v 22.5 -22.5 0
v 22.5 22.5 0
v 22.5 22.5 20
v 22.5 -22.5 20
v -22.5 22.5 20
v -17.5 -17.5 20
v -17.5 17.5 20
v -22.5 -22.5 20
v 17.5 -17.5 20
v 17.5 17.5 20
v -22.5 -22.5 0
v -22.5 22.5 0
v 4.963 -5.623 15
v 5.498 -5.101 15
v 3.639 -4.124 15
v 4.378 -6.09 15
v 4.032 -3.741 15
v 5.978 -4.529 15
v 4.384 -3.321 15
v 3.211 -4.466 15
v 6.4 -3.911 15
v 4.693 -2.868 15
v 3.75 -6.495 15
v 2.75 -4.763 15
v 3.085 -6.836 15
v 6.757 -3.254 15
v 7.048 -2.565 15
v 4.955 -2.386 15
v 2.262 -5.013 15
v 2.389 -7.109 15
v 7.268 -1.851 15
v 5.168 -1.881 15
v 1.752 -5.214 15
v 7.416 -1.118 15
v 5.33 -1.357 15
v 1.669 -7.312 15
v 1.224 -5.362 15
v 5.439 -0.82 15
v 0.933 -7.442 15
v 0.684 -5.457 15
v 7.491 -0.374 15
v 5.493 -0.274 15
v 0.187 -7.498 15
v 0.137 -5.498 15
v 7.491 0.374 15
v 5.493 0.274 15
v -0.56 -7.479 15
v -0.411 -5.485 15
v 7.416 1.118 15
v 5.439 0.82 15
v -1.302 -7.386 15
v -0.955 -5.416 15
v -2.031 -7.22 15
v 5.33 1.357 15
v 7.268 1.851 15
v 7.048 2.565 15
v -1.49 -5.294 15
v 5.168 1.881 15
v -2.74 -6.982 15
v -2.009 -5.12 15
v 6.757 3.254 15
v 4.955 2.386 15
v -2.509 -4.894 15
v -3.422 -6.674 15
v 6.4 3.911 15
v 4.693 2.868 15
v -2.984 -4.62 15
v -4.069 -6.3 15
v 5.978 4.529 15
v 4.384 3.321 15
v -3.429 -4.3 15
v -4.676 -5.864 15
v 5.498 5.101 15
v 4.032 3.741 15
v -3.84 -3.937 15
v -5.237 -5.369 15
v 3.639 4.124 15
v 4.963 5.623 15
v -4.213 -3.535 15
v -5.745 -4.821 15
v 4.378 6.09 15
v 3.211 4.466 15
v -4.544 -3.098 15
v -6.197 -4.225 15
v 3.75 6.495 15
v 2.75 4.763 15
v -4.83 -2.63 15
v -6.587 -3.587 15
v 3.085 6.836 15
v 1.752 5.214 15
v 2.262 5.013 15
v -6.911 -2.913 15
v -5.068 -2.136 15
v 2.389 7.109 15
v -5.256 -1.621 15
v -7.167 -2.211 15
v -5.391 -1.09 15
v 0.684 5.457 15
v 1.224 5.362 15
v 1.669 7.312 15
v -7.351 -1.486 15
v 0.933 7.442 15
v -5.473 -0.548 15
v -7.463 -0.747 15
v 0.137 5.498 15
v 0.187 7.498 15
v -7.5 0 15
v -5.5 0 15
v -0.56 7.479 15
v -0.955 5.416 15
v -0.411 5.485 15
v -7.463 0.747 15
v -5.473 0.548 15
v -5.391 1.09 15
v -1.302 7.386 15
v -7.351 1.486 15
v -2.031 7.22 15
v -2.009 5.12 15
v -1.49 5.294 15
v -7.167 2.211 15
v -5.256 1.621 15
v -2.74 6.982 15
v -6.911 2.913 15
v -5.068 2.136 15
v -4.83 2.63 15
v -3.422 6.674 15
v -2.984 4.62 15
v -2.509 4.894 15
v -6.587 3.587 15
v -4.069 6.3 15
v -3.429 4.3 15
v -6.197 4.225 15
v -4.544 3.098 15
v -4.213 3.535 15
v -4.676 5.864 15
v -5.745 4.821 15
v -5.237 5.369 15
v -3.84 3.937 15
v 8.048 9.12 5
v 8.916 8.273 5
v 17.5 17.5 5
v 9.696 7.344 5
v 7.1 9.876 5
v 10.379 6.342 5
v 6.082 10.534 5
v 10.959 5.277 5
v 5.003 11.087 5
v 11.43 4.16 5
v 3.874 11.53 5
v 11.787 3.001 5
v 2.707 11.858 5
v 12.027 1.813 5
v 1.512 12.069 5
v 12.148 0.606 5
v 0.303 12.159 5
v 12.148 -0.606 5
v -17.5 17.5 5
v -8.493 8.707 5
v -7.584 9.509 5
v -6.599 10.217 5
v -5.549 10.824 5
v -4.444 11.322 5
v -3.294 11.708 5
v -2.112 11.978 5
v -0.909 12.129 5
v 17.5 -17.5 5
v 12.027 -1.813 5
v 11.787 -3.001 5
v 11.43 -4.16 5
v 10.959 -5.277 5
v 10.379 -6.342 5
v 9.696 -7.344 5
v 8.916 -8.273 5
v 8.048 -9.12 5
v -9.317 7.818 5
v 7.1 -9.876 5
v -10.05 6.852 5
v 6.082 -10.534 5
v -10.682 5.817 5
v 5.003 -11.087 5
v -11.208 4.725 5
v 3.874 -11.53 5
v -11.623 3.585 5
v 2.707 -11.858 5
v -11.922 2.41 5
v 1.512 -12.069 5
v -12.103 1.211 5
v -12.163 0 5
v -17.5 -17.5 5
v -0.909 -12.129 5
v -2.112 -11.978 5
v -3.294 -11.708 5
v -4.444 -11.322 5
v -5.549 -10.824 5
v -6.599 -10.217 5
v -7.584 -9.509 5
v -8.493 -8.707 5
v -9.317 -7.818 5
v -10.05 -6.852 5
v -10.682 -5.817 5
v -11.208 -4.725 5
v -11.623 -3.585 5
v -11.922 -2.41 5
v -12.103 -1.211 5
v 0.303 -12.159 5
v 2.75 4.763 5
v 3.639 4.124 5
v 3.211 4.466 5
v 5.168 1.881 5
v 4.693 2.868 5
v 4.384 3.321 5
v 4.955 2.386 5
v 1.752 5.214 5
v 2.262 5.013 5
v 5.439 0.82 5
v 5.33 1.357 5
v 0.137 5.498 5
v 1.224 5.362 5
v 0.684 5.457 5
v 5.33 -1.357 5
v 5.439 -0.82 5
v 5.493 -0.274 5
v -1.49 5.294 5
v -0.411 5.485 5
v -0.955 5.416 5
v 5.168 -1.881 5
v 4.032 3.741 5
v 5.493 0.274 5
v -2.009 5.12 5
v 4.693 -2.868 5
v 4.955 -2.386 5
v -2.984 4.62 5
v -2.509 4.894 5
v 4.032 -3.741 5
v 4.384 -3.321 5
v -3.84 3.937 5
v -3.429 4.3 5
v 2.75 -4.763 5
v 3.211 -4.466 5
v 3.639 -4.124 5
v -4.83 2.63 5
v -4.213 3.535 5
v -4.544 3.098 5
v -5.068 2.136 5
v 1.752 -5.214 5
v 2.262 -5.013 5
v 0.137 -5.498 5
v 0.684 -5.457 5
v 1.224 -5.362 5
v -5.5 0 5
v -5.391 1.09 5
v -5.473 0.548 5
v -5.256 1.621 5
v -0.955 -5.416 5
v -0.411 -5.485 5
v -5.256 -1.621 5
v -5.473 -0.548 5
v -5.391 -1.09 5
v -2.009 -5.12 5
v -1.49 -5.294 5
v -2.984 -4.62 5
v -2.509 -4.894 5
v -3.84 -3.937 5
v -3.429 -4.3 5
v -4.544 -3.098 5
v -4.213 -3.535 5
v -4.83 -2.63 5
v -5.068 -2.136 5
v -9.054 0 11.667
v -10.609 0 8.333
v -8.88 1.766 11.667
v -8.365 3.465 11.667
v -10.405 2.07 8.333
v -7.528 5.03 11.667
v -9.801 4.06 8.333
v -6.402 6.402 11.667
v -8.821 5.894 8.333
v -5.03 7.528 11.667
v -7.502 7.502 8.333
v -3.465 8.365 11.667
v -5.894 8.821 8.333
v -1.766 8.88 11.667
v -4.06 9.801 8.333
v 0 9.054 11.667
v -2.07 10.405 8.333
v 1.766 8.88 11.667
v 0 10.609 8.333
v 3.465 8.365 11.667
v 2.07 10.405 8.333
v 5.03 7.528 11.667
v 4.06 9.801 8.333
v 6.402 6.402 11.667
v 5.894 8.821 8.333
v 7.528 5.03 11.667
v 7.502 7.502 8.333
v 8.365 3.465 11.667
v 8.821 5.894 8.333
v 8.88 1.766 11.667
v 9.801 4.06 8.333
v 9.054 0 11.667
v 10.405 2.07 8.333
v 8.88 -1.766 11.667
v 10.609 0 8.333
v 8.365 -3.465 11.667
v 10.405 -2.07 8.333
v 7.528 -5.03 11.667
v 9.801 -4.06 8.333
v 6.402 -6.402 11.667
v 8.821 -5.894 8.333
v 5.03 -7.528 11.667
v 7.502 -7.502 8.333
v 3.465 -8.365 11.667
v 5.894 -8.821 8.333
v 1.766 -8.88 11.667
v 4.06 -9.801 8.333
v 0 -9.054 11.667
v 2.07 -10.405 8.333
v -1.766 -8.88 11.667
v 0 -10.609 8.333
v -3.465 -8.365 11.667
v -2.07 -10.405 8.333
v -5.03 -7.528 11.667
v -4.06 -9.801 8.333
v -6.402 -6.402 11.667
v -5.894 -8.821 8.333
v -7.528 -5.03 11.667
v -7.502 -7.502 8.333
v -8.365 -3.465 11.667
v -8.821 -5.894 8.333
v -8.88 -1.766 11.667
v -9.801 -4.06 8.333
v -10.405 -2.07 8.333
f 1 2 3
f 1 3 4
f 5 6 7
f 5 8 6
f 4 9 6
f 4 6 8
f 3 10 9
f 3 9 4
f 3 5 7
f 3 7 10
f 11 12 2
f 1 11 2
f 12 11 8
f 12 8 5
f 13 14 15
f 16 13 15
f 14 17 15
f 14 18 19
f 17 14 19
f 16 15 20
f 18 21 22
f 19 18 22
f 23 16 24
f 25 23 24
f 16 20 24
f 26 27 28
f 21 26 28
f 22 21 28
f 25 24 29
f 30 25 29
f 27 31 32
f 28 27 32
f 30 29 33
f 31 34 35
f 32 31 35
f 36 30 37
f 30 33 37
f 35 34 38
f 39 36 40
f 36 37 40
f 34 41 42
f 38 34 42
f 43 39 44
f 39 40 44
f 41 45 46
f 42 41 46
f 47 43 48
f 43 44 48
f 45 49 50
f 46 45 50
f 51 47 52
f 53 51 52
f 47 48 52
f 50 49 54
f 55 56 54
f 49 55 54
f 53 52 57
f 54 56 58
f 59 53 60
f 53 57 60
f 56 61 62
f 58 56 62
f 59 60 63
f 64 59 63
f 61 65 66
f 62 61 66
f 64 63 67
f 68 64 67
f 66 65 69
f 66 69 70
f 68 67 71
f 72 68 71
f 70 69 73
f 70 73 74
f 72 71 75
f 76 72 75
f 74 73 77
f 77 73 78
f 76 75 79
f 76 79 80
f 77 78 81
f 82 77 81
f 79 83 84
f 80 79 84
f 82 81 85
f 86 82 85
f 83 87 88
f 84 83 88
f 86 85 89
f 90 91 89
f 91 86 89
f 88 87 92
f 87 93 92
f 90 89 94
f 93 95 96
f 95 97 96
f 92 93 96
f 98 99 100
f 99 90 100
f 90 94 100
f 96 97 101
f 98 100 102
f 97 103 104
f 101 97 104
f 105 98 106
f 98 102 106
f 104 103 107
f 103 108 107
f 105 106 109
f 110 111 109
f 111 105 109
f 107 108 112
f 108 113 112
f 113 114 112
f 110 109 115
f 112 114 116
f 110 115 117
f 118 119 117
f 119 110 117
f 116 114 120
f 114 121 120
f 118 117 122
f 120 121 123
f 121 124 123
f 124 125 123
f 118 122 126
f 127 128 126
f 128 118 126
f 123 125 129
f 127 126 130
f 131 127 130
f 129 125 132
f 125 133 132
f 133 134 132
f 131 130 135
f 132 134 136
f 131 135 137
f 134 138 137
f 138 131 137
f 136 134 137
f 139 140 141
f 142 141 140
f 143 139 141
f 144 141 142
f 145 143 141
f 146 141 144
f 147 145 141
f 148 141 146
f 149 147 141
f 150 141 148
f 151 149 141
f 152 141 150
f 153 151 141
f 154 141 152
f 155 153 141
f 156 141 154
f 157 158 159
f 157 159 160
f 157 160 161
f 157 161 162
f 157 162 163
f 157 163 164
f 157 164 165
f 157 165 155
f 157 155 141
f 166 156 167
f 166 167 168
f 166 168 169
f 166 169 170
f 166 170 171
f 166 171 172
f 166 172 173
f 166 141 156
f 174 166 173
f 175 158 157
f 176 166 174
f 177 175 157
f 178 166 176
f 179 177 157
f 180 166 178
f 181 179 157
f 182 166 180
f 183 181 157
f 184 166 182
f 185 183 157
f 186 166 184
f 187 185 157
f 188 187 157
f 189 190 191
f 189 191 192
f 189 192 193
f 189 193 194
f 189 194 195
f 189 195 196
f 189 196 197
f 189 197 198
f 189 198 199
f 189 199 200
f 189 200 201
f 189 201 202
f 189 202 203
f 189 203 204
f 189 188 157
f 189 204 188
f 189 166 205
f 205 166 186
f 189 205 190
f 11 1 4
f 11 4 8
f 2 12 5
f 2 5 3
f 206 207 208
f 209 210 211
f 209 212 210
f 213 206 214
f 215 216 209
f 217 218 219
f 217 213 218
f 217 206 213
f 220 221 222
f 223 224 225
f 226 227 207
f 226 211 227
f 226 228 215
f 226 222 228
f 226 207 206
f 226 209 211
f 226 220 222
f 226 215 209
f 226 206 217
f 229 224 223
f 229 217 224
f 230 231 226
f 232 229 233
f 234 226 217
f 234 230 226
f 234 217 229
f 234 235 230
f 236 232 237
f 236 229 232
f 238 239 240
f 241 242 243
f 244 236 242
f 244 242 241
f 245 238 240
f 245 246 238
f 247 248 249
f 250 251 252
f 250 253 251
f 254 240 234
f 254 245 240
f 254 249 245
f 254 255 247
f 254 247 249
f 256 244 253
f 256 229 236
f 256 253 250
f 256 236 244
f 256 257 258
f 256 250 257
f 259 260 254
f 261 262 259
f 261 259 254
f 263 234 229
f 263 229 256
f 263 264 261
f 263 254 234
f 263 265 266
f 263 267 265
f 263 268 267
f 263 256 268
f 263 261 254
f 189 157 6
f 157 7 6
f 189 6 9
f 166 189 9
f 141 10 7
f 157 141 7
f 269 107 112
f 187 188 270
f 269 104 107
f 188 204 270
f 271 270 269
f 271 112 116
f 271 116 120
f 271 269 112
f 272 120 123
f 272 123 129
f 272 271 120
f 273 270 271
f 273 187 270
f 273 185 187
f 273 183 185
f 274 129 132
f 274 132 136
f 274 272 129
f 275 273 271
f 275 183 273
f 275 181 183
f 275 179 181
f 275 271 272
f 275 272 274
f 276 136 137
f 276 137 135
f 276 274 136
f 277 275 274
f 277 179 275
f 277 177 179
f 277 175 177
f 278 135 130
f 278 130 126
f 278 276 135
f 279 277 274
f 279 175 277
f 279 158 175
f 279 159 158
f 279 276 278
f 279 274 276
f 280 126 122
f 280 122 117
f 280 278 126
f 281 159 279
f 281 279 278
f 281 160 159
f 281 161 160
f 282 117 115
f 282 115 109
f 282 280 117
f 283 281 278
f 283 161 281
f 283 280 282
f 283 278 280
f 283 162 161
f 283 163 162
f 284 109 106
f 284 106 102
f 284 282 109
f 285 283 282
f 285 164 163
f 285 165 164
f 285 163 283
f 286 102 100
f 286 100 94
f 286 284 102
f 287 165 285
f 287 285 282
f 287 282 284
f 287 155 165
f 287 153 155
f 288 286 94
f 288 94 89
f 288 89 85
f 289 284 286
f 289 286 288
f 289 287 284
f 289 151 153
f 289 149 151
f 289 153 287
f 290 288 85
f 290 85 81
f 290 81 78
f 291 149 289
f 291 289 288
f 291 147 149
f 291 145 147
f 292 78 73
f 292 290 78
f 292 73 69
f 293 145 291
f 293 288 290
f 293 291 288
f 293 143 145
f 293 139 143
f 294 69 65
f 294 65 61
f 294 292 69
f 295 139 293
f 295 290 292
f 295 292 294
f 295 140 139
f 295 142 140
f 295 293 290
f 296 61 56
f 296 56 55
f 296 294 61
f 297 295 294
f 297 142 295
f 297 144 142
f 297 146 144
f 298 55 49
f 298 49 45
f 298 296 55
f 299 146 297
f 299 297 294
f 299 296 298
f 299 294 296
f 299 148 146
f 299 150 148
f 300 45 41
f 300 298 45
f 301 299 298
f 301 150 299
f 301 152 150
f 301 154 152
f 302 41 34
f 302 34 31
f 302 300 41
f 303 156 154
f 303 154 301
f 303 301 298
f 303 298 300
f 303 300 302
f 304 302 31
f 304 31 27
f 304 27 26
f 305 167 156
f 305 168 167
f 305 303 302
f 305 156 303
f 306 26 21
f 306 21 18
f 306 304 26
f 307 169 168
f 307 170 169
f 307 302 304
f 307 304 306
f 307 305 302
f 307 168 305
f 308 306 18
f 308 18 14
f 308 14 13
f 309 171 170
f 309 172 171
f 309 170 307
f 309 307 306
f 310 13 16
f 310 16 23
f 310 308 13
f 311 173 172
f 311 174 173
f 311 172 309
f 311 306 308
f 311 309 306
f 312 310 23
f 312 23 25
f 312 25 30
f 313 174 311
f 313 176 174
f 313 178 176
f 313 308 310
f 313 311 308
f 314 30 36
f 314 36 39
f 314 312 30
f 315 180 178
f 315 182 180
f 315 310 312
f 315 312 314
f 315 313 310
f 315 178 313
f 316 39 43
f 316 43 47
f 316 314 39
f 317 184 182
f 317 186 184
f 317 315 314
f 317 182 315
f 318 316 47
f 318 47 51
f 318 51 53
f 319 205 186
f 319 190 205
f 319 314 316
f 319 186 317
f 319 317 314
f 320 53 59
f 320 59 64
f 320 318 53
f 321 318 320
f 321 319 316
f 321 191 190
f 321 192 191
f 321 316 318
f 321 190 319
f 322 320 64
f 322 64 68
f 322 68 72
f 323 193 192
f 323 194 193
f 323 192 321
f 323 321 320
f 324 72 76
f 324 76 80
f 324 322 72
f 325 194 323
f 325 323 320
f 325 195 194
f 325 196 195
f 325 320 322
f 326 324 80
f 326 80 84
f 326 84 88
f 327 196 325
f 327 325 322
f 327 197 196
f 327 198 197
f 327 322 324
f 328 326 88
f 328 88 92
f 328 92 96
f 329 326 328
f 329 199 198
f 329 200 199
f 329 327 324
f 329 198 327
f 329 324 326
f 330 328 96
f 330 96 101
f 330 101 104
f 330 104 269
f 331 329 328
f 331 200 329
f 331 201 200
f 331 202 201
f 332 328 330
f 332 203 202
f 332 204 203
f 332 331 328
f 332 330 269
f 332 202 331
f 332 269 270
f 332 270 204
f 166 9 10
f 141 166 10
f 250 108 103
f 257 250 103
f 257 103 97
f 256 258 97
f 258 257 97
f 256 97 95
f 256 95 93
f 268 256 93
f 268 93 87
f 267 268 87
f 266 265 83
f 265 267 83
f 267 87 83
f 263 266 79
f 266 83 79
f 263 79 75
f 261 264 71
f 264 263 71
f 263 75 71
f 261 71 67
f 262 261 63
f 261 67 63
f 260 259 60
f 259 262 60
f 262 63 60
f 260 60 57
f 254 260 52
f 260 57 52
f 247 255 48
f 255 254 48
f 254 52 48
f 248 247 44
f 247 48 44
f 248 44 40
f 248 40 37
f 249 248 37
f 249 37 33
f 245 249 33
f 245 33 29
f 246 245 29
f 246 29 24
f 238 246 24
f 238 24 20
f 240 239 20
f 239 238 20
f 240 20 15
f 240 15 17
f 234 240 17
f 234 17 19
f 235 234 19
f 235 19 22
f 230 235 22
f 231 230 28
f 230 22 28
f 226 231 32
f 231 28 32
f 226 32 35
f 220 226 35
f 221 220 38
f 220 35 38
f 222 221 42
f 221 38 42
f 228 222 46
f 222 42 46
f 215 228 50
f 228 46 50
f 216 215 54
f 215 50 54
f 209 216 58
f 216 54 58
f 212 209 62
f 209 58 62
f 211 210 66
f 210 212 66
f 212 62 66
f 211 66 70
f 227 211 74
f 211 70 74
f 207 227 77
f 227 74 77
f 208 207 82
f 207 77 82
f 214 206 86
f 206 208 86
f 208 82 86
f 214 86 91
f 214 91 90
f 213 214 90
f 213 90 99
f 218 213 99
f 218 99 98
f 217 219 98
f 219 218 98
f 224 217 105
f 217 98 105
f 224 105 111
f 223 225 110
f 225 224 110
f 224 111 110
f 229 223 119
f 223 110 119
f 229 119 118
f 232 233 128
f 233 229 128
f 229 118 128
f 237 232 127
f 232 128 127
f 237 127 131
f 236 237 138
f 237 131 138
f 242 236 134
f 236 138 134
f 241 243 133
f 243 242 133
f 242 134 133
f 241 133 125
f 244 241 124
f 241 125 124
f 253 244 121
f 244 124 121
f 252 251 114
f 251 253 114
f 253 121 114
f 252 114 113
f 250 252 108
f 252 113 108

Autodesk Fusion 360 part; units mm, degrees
sketch "Sketch1" plane through (0, 0, 0) normal (0, 0, 1) x (1, 0, 0)
  line L0 (-22.5, 22.5) -> (22.5, 22.5)
  line L1 (22.5, 22.5) -> (22.5, -22.5)
  line L2 (22.5, -22.5) -> (-22.5, -22.5)
  line L3 (-22.5, -22.5) -> (-22.5, 22.5)
  line L4 (-22.5, 22.5) -> (22.5, -22.5) construction
  dimension "d1" = 45
extrude "Extrude1" add sketch "Sketch1" along normal blind 20
sketch "Sketch2" plane through (0, 0, 20) normal (0, 0, 1) x (-1, 0, 0)
  line L0 (22.5, 22.5) -> (-22.5, 22.5)
  line L1 (-22.5, 22.5) -> (-22.5, -22.5)
  line L2 (-22.5, -22.5) -> (22.5, -22.5)
  line L3 (22.5, -22.5) -> (22.5, 22.5)
  line L4 (-17.5, -17.5) -> (17.5, -17.5)
  line L5 (17.5, -17.5) -> (17.5, 17.5)
  line L6 (17.5, 17.5) -> (-17.5, 17.5)
  line L7 (-17.5, 17.5) -> (-17.5, -17.5)
  line L8 (-17.5, -17.5) -> (17.5, 17.5) construction
  line L9 (17.5, -17.5) -> (-17.5, 17.5) construction
  dimension "d4" = 5
  dimension "d5" = 5
extrude "Extrude2" cut sketch "Sketch2" against normal blind 15 contours L4 L5 L6 L7
sketch "Sketch3" plane through (0, 0, 0) normal (0, 1, 0) x (1, 0, 0)
  line L0 (22.5, -20) -> (22.5, 0)
  line L1 (22.5, 0) -> (-22.5, 0)
  line L2 (-22.5, 0) -> (-22.5, -20)
  line L3 (-22.5, -20) -> (-17.5, -20)
  line L4 (-17.5, -20) -> (-17.5, -5)
  line L5 (-17.5, -5) -> (17.5, -5)
  line L6 (17.5, -5) -> (17.5, -20)
  line L7 (17.5, -20) -> (22.5, -20)
  line L8 (-7.5, -15) -> (7.5, -15)
  line L9 (0, -15) -> (0, -5) construction
  line L10 (-7.5, -15) -> (-12.1631, -5)
  line L11 (7.5, -15) -> (12.1631, -5)
  line L12 (-5.5, -15) -> (5.5, -15)
  line L13 (5.5, -15) -> (5.5, -5)
  line L14 (5.5, -5) -> (-5.5, -5)
  line L15 (-5.5, -5) -> (-5.5, -15)
  dimension "d8" = 15
  dimension "d9" = 65
  dimension "d10" = 65
  dimension "d11" = 11
  dimension "d12" = 10
revolve "Revolve1" add sketch "Sketch3" angle 360 about axis through (0, 0, 15) along (0, 0, -1) contours L5 L8 L10 L15
